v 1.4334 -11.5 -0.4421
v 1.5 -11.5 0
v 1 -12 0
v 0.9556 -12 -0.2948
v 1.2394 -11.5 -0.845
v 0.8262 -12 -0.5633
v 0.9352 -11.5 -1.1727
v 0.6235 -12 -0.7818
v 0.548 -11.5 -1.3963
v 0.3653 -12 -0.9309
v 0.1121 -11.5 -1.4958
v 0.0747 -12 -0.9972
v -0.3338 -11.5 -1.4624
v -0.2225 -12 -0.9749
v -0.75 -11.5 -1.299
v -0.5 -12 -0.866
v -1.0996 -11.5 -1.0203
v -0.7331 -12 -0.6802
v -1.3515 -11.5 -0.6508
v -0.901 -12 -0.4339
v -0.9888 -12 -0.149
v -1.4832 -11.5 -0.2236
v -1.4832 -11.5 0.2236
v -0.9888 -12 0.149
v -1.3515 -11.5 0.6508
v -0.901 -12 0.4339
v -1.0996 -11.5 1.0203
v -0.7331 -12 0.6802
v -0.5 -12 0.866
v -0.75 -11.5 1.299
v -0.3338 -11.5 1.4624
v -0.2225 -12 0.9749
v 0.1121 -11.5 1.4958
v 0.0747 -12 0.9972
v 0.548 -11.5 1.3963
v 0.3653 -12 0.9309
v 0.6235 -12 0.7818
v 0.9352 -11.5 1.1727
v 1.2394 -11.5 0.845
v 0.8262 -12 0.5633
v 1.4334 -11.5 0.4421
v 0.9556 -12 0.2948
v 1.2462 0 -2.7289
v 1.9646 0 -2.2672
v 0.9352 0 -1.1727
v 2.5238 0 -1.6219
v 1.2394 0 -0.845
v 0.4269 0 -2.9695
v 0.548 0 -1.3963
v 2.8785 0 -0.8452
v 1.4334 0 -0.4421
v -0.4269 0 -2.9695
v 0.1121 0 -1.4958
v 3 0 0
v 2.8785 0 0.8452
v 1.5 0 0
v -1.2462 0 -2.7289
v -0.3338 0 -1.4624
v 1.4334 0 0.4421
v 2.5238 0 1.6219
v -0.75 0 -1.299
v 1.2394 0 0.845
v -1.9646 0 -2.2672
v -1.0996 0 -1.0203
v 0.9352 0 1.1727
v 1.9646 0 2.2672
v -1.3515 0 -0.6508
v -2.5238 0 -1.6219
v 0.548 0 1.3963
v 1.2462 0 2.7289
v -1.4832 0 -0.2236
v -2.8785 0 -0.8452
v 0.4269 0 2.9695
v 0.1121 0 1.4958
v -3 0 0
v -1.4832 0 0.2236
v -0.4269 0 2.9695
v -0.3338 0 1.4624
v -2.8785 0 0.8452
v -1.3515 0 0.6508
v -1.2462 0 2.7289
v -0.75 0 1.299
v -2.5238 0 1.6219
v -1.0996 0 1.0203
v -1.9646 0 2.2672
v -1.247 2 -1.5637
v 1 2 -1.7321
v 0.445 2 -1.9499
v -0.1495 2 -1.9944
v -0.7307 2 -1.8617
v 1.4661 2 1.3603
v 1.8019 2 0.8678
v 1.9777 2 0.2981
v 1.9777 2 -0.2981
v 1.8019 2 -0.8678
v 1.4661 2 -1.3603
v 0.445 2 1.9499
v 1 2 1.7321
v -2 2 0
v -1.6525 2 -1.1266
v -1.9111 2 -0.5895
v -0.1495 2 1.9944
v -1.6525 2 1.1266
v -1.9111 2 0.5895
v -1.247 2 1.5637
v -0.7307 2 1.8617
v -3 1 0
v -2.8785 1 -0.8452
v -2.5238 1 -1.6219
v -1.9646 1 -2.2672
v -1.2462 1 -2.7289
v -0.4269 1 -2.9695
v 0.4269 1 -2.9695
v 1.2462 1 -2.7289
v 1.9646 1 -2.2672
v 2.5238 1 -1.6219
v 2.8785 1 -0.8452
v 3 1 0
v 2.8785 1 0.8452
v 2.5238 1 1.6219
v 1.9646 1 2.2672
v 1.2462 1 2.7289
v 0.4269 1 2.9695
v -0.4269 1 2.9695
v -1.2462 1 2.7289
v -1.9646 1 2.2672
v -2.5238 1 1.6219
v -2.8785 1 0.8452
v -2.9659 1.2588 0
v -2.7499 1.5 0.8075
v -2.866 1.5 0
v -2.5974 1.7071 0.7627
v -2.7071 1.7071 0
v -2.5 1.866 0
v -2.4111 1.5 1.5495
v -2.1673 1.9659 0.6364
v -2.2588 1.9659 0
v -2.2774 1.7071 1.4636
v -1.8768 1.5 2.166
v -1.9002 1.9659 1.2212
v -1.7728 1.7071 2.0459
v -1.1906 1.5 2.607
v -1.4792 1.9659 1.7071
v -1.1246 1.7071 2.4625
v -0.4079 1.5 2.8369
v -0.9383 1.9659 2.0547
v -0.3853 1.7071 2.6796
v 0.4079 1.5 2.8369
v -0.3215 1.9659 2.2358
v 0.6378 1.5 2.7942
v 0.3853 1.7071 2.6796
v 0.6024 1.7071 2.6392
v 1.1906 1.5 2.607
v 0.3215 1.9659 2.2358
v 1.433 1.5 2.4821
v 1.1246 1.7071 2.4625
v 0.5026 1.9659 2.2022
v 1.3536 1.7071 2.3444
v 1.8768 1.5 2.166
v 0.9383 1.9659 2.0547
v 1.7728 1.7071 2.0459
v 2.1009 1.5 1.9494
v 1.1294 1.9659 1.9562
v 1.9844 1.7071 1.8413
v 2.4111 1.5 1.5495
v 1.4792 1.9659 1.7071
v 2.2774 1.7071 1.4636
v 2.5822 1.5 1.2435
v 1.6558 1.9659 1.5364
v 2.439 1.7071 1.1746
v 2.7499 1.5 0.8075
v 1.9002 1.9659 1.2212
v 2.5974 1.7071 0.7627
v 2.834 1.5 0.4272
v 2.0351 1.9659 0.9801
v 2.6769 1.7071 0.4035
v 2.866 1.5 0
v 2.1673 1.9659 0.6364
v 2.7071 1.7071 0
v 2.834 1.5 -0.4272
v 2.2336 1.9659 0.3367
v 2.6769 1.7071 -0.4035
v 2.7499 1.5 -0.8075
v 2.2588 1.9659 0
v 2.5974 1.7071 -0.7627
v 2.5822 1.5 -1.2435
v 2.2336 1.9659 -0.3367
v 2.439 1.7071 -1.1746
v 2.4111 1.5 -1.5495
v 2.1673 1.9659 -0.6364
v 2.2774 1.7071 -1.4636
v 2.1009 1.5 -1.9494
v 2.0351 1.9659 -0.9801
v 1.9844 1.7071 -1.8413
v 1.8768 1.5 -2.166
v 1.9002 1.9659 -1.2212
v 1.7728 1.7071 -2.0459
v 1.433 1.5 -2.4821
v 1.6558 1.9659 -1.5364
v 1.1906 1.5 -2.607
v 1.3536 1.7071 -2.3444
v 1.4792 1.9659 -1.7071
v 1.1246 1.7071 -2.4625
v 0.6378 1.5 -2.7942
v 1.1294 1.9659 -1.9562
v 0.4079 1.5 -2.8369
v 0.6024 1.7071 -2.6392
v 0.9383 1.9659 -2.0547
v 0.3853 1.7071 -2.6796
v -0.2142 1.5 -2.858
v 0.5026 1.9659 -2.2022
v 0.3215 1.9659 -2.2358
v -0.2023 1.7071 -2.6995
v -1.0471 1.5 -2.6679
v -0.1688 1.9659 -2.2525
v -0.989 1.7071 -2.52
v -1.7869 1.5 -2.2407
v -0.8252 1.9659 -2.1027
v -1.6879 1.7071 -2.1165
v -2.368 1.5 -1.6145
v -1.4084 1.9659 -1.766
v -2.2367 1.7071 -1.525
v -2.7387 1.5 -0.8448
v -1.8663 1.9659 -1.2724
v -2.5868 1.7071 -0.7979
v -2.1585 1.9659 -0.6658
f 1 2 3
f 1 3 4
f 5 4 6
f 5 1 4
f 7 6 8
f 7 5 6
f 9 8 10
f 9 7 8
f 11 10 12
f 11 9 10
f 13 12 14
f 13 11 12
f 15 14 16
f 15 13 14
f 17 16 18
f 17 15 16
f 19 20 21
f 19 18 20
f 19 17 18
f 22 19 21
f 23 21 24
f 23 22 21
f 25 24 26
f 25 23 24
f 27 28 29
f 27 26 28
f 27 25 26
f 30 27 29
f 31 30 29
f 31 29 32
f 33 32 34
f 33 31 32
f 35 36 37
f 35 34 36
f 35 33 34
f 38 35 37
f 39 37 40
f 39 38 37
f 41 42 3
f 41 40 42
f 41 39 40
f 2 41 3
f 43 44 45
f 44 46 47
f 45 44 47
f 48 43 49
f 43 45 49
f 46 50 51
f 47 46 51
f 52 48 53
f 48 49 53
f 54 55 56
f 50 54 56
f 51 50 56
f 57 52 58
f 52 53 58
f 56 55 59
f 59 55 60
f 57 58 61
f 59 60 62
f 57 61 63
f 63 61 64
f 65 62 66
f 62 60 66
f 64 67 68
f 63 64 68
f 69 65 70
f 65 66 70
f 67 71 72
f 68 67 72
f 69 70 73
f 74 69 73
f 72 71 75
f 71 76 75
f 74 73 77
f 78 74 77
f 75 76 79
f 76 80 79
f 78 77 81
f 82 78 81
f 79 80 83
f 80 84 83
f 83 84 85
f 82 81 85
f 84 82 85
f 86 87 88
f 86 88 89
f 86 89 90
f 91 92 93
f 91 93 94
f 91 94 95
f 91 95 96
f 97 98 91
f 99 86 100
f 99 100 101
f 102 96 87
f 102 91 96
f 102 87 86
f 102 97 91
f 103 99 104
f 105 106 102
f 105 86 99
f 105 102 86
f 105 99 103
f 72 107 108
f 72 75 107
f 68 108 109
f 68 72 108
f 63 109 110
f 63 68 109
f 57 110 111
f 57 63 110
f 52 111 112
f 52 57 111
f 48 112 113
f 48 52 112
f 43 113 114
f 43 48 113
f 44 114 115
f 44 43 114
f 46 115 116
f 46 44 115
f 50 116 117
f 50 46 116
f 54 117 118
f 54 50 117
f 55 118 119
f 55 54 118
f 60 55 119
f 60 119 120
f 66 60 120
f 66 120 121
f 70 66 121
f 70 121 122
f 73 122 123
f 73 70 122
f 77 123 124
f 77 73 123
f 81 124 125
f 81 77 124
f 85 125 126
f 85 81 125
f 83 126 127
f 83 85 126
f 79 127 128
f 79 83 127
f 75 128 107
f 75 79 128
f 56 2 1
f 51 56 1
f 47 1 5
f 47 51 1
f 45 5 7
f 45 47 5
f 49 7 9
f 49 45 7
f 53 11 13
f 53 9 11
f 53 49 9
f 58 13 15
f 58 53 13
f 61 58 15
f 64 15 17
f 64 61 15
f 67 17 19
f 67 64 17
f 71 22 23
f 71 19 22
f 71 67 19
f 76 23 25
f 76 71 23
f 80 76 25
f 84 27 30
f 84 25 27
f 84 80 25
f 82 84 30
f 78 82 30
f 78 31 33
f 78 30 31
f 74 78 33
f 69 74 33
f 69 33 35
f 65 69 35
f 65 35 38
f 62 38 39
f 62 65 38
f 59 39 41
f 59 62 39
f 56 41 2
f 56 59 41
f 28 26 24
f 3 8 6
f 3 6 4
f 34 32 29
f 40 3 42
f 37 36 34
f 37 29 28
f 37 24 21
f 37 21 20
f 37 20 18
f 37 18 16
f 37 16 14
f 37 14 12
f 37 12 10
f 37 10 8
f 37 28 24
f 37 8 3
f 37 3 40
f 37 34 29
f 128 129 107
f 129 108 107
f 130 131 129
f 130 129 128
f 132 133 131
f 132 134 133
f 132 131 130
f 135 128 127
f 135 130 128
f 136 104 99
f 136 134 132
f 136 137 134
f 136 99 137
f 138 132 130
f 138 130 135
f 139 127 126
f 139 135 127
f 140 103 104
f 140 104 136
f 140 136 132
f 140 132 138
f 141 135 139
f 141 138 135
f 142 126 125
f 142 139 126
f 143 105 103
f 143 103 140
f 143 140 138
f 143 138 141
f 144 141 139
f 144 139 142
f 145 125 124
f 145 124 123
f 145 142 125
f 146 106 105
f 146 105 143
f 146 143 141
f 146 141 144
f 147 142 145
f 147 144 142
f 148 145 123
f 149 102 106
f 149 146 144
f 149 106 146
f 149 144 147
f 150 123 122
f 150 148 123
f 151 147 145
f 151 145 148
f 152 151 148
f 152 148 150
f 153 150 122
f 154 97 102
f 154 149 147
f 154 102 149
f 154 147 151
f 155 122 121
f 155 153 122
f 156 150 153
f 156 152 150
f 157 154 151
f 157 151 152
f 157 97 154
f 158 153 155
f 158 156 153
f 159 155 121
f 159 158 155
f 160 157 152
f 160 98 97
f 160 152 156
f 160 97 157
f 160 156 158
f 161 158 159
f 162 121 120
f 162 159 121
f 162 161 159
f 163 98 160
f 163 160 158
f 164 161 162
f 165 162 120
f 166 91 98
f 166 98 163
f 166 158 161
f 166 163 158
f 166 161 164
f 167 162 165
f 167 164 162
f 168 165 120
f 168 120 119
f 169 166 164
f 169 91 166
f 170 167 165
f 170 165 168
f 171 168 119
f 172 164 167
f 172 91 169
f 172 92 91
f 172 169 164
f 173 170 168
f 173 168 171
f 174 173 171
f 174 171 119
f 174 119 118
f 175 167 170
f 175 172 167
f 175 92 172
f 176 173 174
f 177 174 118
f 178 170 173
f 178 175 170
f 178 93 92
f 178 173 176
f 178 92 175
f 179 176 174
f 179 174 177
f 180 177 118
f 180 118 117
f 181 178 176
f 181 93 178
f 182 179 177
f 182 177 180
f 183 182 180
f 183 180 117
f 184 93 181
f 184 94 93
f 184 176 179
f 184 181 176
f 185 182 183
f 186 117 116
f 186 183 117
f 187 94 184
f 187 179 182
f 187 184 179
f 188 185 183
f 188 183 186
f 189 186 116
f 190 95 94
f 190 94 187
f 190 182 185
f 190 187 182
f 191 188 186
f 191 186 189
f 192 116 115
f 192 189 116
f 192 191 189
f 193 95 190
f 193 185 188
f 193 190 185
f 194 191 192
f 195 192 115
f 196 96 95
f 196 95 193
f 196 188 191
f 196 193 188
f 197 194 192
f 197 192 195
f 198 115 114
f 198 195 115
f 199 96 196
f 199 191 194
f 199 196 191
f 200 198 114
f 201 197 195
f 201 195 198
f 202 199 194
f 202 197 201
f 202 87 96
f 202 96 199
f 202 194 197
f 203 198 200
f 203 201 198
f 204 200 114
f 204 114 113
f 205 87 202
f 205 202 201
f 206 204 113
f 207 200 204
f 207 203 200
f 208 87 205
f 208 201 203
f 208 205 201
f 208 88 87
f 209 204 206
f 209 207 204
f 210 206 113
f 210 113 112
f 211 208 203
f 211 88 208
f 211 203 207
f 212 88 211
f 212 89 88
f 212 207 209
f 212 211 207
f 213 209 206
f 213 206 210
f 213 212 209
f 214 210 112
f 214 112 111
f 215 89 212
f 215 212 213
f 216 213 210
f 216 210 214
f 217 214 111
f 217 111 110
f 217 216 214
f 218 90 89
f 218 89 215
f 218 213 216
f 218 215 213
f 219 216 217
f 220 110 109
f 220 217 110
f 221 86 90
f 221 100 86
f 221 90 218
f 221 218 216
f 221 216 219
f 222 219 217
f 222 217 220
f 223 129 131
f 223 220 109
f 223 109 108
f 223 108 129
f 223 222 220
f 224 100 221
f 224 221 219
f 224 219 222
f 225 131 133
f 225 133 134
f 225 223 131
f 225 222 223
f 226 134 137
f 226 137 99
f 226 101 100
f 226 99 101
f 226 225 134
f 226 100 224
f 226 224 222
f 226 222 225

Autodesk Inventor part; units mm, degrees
ref_plane "YZ Plane" through (0, 0, 0) normal (1, 0, 0) x (0, 1, 0)
ref_plane "XZ Plane" through (0, 0, 0) normal (0, 1, 0) x (-1, 0, 0)
ref_plane "XY Plane" through (0, 0, 0) normal (0, 0, 1) x (1, 0, 0)
sketch "Sketch1" plane through (0, 0, 0) normal (0, 1, 0) x (-1, 0, 0)
  circle A0 centre (0, 0) radius 3
  dimension "d0" = 6
extrude "Extrusion1" add sketch "Sketch1" along normal blind 2
sketch "Sketch2" plane through (0, 0, 0) normal (0, -1, 0) x (1, 0, 0)
  circle A0 centre (0, 0) radius 1.5
  dimension "d3" = 3
extrude "Extrusion2" add sketch "Sketch2" along normal blind 12
chamfer "Chamfer1" distance 0.5 angle 45 1 edges at (-1.5, -12, 0)
fillet "Fillet1" radius 1 1 edges at (3, 2, 0)
properties part number "plastic M3 bolt"
